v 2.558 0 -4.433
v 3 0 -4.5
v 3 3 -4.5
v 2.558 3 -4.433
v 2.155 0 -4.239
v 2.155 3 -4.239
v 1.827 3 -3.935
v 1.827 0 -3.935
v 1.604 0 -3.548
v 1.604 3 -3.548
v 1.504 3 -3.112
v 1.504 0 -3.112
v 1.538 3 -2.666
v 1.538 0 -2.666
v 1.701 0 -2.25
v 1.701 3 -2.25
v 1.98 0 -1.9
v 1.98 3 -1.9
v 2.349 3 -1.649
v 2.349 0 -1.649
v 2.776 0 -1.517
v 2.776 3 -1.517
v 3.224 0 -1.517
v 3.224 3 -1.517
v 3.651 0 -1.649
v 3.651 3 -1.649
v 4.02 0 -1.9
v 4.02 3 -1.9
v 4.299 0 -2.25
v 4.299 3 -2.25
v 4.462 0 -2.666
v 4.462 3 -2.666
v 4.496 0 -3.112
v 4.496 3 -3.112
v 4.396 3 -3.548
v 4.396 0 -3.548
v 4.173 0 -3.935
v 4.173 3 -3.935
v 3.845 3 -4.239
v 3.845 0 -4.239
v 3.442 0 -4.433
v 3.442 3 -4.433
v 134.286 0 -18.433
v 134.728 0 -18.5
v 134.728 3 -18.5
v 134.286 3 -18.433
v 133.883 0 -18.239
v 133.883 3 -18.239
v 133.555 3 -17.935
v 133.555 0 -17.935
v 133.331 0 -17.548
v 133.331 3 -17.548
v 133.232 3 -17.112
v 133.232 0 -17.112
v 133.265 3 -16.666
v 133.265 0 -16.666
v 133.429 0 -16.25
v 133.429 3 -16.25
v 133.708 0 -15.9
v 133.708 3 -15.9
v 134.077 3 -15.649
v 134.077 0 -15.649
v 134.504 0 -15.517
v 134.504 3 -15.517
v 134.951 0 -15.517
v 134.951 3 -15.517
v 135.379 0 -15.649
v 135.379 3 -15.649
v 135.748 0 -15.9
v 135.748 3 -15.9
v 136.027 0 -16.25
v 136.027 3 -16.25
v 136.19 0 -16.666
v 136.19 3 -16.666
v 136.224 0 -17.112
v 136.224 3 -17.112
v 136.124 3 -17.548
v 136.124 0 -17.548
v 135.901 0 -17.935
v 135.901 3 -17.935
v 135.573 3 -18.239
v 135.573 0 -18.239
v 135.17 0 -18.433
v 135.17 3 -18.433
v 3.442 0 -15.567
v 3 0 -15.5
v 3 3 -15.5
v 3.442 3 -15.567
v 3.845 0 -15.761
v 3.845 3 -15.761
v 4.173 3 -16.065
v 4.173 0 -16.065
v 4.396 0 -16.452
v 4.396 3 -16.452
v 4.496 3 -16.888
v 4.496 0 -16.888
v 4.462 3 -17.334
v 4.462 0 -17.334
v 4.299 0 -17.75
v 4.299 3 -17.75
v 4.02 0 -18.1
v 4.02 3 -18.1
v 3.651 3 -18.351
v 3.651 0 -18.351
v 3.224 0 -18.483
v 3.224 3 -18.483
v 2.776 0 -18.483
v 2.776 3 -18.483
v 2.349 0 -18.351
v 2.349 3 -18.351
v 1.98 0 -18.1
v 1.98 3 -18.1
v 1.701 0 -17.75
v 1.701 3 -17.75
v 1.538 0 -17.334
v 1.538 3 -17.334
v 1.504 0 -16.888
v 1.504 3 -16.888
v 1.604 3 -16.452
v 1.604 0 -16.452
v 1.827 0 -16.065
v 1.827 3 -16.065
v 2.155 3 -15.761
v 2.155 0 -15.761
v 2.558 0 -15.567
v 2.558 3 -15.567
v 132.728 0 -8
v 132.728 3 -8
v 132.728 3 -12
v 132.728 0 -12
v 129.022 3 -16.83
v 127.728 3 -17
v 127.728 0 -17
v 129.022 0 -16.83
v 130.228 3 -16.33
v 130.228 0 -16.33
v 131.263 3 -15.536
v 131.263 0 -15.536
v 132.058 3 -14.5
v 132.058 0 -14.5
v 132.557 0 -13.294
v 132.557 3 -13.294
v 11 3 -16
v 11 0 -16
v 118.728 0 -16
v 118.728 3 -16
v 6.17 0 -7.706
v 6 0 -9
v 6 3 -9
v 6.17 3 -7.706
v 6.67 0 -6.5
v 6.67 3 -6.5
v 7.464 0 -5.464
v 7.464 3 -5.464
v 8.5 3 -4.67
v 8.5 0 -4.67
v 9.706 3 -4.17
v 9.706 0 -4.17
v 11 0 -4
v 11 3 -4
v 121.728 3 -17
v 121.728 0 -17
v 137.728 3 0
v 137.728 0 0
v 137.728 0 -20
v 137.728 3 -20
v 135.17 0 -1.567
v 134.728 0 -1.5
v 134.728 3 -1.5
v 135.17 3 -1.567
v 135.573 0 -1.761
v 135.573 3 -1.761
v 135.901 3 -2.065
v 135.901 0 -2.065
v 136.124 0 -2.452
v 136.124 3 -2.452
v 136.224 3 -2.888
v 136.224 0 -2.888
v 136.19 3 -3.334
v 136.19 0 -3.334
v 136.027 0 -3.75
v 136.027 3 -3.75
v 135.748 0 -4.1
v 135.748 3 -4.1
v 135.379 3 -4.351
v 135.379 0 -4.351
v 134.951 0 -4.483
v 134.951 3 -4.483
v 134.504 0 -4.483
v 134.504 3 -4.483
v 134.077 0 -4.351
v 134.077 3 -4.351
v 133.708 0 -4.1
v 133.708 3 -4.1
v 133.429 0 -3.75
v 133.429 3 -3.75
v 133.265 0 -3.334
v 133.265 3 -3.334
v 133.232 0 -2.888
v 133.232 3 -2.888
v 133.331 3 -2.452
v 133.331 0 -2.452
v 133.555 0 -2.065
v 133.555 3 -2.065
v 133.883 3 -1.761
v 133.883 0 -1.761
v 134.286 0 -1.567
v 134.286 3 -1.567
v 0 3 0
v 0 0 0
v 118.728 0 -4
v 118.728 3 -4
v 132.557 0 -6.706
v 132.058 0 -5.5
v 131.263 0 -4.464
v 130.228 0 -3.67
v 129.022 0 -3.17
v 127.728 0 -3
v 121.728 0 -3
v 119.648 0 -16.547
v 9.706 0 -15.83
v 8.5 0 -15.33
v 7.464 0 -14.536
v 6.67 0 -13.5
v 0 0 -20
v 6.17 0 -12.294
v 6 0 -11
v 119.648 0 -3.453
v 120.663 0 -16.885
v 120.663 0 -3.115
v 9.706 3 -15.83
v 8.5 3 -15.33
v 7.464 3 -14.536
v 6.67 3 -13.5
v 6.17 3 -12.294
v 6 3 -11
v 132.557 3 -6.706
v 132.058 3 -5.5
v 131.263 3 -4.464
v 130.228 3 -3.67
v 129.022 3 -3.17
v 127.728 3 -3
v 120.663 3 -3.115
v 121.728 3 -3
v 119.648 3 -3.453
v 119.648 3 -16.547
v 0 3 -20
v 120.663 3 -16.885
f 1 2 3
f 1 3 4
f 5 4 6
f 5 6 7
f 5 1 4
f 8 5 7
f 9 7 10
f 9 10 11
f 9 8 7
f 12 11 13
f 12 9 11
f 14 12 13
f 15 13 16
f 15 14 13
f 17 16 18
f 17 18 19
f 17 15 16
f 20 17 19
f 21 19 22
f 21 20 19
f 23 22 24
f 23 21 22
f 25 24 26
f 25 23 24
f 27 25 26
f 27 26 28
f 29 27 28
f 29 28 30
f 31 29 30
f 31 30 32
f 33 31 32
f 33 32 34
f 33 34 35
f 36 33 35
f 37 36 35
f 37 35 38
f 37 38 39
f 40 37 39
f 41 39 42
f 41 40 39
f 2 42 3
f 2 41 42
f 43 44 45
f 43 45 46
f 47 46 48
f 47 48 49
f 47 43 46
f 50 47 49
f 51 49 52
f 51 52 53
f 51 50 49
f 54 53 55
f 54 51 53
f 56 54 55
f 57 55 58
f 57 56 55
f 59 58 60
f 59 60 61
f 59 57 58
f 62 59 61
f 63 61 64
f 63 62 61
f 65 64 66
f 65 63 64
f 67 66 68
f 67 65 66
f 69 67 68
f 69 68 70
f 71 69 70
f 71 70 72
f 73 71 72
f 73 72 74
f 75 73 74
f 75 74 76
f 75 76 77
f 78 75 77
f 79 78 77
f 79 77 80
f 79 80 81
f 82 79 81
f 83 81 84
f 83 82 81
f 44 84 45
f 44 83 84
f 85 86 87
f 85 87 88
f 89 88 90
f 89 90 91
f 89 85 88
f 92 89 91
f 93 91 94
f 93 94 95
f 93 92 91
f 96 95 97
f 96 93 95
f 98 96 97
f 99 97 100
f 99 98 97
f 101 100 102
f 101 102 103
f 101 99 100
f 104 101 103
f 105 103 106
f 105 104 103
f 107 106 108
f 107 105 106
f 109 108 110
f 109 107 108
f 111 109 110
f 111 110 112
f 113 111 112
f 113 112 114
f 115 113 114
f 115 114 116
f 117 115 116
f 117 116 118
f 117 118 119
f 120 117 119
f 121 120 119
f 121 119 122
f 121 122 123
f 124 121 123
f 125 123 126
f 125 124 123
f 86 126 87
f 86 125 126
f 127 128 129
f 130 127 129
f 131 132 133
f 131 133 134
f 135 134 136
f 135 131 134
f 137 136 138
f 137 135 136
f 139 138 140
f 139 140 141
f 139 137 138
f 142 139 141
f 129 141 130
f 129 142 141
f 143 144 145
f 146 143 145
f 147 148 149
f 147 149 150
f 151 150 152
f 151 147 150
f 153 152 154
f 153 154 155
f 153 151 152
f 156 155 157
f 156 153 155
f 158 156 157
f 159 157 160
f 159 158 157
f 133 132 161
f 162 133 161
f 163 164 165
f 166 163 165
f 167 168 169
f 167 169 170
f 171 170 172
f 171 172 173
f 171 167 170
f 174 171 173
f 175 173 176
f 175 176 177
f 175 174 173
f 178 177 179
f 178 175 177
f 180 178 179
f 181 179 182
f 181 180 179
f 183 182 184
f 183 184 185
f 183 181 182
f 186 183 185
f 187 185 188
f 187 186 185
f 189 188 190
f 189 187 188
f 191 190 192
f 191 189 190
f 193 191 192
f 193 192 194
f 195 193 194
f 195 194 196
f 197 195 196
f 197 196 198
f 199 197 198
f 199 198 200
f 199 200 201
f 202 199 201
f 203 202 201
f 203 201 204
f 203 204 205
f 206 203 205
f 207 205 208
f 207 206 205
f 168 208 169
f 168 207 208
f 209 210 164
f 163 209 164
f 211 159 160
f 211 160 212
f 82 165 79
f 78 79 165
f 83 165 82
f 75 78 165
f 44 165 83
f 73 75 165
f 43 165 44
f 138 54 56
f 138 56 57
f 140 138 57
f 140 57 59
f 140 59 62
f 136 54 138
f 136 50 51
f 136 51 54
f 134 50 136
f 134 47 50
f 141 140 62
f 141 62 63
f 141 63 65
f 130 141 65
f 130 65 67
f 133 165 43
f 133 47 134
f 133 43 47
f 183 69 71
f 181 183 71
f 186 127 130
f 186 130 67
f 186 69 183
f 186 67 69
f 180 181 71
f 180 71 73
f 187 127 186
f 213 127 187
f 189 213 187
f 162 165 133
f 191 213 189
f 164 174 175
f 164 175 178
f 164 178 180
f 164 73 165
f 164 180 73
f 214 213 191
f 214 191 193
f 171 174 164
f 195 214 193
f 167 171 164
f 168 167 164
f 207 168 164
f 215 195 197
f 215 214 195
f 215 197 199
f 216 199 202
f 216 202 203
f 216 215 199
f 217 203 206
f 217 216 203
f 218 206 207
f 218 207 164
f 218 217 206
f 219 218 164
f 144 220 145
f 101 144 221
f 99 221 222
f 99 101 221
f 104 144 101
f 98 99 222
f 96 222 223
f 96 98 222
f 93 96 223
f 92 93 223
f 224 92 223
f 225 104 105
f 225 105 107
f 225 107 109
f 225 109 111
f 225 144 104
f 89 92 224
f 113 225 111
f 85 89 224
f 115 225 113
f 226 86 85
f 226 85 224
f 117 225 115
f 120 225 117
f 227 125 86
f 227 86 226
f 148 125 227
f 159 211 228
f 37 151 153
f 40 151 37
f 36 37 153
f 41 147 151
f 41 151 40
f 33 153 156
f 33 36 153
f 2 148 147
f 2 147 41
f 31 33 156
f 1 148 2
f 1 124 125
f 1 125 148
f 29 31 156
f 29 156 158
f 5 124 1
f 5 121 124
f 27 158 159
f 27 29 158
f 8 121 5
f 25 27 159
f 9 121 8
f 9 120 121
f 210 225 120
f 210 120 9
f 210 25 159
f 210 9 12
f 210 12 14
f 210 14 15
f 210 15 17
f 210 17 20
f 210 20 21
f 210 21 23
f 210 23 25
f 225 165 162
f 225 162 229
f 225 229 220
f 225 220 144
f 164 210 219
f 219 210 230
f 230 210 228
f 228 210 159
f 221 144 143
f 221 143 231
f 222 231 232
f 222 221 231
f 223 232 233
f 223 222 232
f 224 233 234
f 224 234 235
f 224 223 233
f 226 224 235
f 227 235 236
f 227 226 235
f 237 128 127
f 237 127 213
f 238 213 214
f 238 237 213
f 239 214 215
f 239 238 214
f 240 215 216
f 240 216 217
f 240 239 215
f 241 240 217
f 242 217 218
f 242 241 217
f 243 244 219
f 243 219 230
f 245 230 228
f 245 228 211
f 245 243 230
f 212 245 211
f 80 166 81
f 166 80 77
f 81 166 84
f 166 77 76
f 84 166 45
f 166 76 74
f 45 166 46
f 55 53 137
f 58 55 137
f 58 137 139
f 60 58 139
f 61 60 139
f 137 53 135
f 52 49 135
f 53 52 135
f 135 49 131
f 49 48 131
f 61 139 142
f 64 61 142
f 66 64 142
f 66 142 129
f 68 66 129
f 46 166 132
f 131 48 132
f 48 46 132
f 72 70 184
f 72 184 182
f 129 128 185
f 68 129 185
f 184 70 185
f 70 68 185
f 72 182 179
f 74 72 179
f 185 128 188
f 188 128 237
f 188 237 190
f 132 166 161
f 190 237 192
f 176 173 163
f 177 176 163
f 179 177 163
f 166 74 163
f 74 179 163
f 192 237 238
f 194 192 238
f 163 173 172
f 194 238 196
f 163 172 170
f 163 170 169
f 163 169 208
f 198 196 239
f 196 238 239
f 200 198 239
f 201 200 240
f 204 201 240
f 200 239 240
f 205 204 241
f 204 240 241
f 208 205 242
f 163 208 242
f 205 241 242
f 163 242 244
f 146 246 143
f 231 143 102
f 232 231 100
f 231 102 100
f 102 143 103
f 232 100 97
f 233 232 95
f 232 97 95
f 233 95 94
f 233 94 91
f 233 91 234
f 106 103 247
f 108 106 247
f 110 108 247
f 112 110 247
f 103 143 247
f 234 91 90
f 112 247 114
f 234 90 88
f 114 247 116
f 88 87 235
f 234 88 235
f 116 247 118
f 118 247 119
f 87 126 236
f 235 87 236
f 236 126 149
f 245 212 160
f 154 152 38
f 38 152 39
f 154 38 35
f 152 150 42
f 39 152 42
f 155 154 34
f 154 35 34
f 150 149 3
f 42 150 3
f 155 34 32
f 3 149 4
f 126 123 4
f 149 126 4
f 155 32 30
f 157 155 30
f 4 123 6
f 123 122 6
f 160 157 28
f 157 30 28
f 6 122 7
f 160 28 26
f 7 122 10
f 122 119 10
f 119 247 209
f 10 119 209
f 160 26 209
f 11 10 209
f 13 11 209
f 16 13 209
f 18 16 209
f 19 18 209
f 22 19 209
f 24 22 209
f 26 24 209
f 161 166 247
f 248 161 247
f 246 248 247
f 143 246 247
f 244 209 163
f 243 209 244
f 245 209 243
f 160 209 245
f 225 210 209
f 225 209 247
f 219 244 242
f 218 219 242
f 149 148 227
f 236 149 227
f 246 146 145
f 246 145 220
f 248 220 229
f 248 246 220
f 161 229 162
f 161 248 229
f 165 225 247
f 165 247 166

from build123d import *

# Parameters (mm, degrees)
SKETCH1_W           = 137.727780531
SKETCH1_H           = 20
SKETCH1_R           = 1.5
SKETCH1_W_2         = 125.727780531
SKETCH1_H_2         = 12
BOSS_EXTRUDE1_DEPTH = 3
CUT_EXTRUDE1_DEPTH  = 140.204674958
FILLET1_R           = 5


with BuildPart() as part:
    # Sketch1 → Boss-Extrude1 (new body)
    with BuildSketch(Plane(origin=(0, 0, 0), x_dir=(1, 0, 0), z_dir=(0, 1, 0))):
        with Locations((68.863890266, 10)):
            Rectangle(SKETCH1_W, SKETCH1_H)
        with Locations(Location((3, 17, 0), (0, 0, 270))):
            Circle(SKETCH1_R, mode=Mode.SUBTRACT)
        with Locations(Location((3, 3, 0), (0, 0, 90))):
            Circle(SKETCH1_R, mode=Mode.SUBTRACT)
        with Locations(Location((134.727780531, 3, 0), (0, 0, 270))):
            Circle(SKETCH1_R, mode=Mode.SUBTRACT)
        with Locations(Location((134.727780531, 17, 0), (0, 0, 90))):
            Circle(SKETCH1_R, mode=Mode.SUBTRACT)
        with Locations((68.863890266, 10)):
            Rectangle(SKETCH1_W_2, SKETCH1_H_2, mode=Mode.SUBTRACT)
    extrude(amount=BOSS_EXTRUDE1_DEPTH)

    # Sketch2 → Cut-Extrude1 (cut, through all)
    with BuildSketch(Plane(origin=(0, 3, 0), x_dir=(1, 0, 0), z_dir=(0, 1, 0))):
        Polygon((118.727780531, 17), (118.727780531, 16), (131.727780531, 16), (131.727780531, 4), (118.727780531, 4), (118.727780531, 3), (132.727780531, 3), (132.727780531, 17), align=None)
    extrude(amount=-CUT_EXTRUDE1_DEPTH, mode=Mode.SUBTRACT)

    # Fillet1
    # the kernel refuses this fillet: 5 mm, written as the material it adds along each edge
    with BuildSketch(Plane(origin=(132.727780531, 3, -17), x_dir=(0, 0, 1), z_dir=(0, -1, 0)), Plane(origin=(132.727780531, 3, -3), x_dir=(-1, 0, 0), z_dir=(0, -1, 0)), Plane(origin=(6, 0, -16), x_dir=(0, 0, 1), z_dir=(0, 1, 0))) as fillet1_piece_1:
        with BuildLine():
            CenterArc((FILLET1_R, FILLET1_R), FILLET1_R, 180, 90)
            Line((0, FILLET1_R), (-FILLET1_R * 0.02, FILLET1_R))
            Line((-FILLET1_R * 0.02, FILLET1_R), (-FILLET1_R * 0.02, -FILLET1_R * 0.02))
            Line((-FILLET1_R * 0.02, -FILLET1_R * 0.02), (FILLET1_R, -FILLET1_R * 0.02))
            Line((FILLET1_R, -FILLET1_R * 0.02), (FILLET1_R, 0))
        make_face()
    extrude(amount=3)
    with BuildSketch(Plane(origin=(118.727780531, 3, -17), x_dir=(1, 0, 0), z_dir=(0, -1, 0))) as fillet1_piece_2:
        with BuildLine():
            CenterArc((3, 5), FILLET1_R, 233.130102354, 36.869897646)
            Line((0, 1), (-0.06, 0.92))
            ThreePointArc((-0.06, 0.92), (-0.1, 0.5), (-0.1, 0))
            Line((-0.1, 0), (0, -0.1))
            Line((0, -0.1), (3, -0.1))
            Line((3, -0.1), (3, 0))
        make_face()
    extrude(amount=3)
    with BuildSketch(Plane(origin=(118.727780531, 3, -3), x_dir=(0, 0, -1), z_dir=(0, -1, 0))) as fillet1_piece_3:
        with BuildLine():
            CenterArc((5, 3), FILLET1_R, 180, 36.869897646)
            Line((0, 3), (-0.1, 3))
            Line((-0.1, 3), (-0.1, 0))
            Line((-0.1, 0), (0, -0.1))
            ThreePointArc((0, -0.1), (0.5, -0.1), (0.92, -0.06))
            Line((0.92, -0.06), (1, 0))
        make_face()
    extrude(amount=3)
    with BuildSketch(Plane(origin=(6, 0, -4), x_dir=(0, 0, -1), z_dir=(0, 1, 0))) as fillet1_piece_4:
        with BuildLine():
            CenterArc((FILLET1_R, -FILLET1_R), FILLET1_R, 90, 90)
            Line((0, -FILLET1_R), (-FILLET1_R * 0.02, -FILLET1_R))
            Line((-FILLET1_R * 0.02, -FILLET1_R), (-FILLET1_R * 0.02, FILLET1_R * 0.02))
            Line((-FILLET1_R * 0.02, FILLET1_R * 0.02), (FILLET1_R, FILLET1_R * 0.02))
            Line((FILLET1_R, FILLET1_R * 0.02), (FILLET1_R, 0))
        make_face()
    extrude(amount=3)


solid = part.part
